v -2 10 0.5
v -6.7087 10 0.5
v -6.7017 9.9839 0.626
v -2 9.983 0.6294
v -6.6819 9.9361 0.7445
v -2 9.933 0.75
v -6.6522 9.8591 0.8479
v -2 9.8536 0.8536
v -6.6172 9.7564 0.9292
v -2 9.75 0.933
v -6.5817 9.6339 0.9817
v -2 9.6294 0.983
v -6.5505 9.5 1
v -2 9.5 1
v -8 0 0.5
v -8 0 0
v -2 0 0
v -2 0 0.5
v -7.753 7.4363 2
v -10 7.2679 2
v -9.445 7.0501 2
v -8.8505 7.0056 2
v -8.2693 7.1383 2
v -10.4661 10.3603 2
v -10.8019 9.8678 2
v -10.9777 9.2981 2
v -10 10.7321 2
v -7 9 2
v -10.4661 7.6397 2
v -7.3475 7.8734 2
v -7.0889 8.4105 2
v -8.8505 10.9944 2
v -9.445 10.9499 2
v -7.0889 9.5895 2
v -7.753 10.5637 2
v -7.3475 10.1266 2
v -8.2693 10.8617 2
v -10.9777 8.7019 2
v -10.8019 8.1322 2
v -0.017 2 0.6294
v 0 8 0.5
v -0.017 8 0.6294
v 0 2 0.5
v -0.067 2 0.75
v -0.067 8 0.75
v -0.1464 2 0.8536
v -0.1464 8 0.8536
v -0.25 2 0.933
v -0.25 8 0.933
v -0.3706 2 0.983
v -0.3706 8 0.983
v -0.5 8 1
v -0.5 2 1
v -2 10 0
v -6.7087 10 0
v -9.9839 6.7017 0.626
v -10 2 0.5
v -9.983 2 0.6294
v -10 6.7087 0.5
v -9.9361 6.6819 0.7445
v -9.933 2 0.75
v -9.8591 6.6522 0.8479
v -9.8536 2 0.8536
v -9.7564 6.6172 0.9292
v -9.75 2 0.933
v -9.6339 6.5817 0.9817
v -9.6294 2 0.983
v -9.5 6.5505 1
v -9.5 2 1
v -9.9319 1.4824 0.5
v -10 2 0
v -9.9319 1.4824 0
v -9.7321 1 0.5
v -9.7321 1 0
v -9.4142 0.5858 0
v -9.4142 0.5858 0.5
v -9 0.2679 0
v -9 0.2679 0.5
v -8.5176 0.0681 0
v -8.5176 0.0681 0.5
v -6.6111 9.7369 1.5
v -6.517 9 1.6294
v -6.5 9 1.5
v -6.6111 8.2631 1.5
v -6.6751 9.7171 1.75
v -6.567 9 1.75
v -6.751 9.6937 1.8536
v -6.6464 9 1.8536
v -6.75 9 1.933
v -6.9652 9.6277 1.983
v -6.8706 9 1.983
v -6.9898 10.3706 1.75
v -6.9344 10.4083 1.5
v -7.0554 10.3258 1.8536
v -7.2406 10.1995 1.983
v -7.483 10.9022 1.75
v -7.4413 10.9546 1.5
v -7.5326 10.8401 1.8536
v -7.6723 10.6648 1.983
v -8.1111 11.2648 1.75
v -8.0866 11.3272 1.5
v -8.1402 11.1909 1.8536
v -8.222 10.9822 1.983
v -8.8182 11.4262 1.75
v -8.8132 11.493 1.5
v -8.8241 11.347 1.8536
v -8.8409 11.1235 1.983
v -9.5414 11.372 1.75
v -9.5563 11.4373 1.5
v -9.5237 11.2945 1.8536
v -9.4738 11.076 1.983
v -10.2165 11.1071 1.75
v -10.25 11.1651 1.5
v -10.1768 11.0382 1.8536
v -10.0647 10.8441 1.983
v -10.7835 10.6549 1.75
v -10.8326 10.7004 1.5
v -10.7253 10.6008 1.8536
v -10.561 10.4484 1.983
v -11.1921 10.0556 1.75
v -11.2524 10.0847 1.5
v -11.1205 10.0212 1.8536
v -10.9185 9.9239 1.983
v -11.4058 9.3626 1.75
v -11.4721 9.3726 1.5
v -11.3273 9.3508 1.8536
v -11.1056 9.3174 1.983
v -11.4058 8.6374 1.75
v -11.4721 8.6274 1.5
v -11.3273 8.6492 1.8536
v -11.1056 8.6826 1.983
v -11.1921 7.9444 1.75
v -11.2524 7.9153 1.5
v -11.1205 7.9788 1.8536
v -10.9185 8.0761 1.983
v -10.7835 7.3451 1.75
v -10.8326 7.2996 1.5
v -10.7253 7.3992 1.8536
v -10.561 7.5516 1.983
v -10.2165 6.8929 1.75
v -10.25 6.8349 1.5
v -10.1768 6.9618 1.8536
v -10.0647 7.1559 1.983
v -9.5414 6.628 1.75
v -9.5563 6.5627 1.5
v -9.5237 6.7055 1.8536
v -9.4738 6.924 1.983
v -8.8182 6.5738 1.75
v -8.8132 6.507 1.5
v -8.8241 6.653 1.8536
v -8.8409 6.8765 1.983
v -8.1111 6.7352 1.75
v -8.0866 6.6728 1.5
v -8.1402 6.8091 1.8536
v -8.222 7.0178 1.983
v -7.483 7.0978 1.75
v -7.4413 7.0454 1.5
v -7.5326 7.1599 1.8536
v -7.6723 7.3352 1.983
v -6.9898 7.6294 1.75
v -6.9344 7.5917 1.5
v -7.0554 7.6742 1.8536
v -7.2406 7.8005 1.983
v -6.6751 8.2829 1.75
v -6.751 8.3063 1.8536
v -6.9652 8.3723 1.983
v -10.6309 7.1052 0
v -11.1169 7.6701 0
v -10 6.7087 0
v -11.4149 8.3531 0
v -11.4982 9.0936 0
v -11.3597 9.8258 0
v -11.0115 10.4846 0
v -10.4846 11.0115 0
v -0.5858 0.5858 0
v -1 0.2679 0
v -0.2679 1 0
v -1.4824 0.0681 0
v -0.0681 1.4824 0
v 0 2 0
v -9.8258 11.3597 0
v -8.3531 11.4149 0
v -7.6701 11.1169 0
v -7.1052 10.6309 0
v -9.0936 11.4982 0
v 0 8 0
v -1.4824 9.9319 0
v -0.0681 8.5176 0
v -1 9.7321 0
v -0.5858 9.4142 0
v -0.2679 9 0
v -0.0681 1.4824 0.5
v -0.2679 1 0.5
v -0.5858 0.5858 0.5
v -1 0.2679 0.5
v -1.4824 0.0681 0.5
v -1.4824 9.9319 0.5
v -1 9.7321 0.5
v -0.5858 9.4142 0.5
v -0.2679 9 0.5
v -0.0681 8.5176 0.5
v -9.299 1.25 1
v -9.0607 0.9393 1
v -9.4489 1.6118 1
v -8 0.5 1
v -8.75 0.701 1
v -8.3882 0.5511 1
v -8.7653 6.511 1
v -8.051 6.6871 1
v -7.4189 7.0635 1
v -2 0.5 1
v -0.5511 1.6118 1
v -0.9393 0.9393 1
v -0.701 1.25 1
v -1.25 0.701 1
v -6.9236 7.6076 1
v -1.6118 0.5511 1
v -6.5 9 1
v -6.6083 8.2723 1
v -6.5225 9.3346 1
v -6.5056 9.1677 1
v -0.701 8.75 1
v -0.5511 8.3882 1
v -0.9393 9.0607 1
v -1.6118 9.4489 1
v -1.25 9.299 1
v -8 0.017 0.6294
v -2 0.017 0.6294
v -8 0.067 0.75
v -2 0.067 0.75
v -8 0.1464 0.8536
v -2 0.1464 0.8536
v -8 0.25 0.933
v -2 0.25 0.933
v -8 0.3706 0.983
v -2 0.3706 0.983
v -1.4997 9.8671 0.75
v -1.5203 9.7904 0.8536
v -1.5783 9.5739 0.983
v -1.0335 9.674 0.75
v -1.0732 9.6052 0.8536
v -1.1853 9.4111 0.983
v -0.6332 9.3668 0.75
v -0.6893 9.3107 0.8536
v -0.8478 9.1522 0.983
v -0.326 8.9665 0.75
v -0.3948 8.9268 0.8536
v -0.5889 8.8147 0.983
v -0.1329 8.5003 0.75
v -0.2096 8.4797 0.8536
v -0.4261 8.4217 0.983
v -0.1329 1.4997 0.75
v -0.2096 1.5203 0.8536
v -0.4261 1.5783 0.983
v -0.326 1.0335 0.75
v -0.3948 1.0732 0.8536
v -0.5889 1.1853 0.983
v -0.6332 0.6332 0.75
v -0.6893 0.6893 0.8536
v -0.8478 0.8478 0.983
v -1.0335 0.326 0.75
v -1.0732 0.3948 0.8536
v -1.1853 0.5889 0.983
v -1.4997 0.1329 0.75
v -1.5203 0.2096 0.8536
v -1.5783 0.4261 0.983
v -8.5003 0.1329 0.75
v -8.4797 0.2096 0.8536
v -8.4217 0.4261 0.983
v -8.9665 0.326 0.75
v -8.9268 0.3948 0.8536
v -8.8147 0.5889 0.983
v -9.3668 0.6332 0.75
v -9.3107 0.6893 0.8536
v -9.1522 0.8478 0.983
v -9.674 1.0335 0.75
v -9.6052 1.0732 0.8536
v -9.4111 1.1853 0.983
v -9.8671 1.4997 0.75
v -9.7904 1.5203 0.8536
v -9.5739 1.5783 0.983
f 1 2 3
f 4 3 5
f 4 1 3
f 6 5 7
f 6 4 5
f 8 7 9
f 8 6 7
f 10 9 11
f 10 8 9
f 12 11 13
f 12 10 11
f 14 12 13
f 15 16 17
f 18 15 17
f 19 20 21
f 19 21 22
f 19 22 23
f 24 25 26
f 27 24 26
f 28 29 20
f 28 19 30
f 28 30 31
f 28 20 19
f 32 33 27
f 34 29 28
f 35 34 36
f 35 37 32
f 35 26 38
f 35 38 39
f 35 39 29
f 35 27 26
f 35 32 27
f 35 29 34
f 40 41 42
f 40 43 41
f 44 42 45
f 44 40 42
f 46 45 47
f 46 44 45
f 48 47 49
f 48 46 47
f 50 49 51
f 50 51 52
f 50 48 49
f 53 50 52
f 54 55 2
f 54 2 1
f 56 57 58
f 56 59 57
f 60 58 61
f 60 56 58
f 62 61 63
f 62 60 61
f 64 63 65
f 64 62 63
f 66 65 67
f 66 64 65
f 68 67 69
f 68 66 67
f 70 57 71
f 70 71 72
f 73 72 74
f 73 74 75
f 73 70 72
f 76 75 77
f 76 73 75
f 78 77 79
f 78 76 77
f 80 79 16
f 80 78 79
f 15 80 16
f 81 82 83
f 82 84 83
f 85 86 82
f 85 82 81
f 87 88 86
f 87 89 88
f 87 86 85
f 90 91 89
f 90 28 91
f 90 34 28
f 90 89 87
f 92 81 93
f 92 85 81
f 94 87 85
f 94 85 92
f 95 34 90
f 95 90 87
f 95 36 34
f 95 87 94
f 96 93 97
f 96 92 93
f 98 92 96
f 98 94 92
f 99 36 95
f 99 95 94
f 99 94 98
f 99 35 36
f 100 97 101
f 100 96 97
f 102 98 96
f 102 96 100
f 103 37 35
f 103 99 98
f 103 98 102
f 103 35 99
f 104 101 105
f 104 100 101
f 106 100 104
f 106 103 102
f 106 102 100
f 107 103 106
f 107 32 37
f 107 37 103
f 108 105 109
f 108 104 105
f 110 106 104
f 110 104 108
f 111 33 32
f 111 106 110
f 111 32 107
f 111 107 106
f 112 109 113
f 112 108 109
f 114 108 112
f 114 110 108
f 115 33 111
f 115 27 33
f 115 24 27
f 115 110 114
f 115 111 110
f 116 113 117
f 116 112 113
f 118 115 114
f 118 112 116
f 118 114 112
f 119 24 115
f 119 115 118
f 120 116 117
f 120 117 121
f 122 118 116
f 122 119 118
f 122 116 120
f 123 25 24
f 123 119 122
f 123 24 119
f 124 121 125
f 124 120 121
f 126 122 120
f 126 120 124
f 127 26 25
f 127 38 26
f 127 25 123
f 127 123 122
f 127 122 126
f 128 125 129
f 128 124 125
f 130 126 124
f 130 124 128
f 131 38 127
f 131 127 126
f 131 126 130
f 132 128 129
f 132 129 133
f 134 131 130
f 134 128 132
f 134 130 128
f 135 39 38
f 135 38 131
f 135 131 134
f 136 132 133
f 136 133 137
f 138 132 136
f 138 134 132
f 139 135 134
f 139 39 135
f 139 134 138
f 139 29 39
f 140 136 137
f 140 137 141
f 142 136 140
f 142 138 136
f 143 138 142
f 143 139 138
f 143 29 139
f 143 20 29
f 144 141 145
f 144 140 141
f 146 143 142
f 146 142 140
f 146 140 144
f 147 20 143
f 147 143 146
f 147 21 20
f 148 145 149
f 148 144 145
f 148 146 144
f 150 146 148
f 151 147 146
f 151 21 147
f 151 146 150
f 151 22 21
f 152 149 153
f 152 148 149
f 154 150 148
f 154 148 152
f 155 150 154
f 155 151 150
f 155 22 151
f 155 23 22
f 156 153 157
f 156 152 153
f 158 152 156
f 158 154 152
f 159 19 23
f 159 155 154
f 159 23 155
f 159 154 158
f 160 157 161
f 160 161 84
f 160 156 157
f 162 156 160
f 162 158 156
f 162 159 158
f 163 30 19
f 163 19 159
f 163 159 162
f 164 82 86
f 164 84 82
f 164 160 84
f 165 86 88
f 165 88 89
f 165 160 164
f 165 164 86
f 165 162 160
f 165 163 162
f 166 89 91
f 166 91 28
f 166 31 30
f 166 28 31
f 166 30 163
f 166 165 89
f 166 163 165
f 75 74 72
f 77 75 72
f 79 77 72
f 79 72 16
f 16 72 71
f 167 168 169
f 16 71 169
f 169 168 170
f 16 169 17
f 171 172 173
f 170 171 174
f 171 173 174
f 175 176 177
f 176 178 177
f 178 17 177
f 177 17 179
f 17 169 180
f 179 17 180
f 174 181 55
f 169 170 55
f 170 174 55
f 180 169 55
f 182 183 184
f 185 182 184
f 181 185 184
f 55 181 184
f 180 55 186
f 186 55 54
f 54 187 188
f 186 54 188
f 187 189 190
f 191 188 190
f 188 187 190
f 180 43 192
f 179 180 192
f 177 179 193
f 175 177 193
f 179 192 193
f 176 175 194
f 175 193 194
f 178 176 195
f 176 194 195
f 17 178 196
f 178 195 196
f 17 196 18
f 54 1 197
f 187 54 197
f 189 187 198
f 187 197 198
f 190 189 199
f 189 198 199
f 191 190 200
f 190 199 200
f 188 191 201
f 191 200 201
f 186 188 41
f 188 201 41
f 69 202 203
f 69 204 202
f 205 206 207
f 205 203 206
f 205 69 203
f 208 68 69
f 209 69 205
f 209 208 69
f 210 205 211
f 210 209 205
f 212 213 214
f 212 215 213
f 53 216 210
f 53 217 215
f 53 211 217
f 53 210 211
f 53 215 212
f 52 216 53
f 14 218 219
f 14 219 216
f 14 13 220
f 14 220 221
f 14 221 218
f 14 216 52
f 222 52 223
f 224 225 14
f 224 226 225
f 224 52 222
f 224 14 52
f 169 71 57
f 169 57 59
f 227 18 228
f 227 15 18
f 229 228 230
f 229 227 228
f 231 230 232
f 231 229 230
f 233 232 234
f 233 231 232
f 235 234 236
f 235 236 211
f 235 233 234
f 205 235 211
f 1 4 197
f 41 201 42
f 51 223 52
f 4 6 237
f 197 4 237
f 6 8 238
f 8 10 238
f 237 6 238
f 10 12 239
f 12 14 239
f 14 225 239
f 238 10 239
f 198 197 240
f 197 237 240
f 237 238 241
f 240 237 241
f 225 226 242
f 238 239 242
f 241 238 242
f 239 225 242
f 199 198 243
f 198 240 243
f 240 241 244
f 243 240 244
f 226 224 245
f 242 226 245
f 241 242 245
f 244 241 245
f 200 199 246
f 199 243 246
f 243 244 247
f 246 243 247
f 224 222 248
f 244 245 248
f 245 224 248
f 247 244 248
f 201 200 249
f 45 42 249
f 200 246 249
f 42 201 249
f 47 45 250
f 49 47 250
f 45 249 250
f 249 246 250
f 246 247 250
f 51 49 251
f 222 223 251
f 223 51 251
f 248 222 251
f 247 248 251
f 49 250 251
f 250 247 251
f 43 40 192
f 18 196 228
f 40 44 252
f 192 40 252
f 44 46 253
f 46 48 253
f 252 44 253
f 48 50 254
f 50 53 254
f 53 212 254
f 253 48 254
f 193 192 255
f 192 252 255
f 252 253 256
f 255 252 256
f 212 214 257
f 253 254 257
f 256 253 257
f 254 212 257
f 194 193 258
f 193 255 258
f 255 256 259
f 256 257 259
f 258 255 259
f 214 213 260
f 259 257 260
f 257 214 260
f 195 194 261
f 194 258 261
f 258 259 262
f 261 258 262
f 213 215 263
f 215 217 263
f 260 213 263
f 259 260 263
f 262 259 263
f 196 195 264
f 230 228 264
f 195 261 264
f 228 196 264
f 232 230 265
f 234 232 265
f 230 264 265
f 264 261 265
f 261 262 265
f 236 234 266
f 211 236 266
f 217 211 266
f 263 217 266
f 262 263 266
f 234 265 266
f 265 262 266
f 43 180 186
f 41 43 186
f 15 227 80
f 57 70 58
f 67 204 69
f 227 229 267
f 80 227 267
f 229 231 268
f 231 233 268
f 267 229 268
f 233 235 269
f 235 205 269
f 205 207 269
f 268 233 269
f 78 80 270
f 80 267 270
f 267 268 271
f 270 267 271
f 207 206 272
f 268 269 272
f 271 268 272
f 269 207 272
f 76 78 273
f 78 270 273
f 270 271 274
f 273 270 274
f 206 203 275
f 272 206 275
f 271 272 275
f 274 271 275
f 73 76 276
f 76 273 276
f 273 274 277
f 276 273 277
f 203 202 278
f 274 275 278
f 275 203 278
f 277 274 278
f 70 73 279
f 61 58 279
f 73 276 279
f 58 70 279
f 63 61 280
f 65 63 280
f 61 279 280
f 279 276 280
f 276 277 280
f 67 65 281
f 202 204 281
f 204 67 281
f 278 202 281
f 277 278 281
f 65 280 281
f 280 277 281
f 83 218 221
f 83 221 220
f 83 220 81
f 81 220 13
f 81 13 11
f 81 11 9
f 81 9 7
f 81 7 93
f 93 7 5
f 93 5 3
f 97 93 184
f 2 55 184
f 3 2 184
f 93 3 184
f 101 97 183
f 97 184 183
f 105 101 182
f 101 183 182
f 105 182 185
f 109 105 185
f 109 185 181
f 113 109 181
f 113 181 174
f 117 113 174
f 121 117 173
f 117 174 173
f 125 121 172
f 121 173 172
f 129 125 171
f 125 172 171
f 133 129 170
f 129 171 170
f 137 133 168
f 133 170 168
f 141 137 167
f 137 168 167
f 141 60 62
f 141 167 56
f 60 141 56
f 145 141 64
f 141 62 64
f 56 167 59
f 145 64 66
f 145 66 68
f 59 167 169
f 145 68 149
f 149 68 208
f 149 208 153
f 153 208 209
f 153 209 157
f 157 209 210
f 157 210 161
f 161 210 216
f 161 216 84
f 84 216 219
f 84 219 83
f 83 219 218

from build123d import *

# Parameters (mm, degrees)
F0_W     = 10
F0_H     = 10
F1_DEPTH = 1
F2_R     = 2.5
F3_DEPTH = 2
F4_R     = 2
F5_R     = 0.5


with BuildPart() as f1:
    # F0 (on Top) → F1 (new body)
    with BuildSketch(Plane.XY):
        with Locations((-5, 5)):
            Rectangle(F0_W, F0_H)
    extrude(amount=F1_DEPTH)

    # F2 (on Top) → F3 (join)
    with BuildSketch(Plane.XY):
        with Locations((-9, 9)):
            Circle(F2_R)
    extrude(amount=F3_DEPTH)

    # F4
    f4_edges = [f1.edges().sort_by_distance(p)[0] for p in [
        (0, 10, 0.5),
        (0, 0, 0.5),
        (-10, 0, 0.5),
    ]]
    fillet(f4_edges, radius=F4_R)

    # F5
    f5_edges = [f1.edges().sort_by_distance(p)[0] for p in [
        (-10, 4.354356, 1),
        (-11.5, 9, 2),
    ]]
    fillet(f5_edges, radius=F5_R)


solid = f1.part
